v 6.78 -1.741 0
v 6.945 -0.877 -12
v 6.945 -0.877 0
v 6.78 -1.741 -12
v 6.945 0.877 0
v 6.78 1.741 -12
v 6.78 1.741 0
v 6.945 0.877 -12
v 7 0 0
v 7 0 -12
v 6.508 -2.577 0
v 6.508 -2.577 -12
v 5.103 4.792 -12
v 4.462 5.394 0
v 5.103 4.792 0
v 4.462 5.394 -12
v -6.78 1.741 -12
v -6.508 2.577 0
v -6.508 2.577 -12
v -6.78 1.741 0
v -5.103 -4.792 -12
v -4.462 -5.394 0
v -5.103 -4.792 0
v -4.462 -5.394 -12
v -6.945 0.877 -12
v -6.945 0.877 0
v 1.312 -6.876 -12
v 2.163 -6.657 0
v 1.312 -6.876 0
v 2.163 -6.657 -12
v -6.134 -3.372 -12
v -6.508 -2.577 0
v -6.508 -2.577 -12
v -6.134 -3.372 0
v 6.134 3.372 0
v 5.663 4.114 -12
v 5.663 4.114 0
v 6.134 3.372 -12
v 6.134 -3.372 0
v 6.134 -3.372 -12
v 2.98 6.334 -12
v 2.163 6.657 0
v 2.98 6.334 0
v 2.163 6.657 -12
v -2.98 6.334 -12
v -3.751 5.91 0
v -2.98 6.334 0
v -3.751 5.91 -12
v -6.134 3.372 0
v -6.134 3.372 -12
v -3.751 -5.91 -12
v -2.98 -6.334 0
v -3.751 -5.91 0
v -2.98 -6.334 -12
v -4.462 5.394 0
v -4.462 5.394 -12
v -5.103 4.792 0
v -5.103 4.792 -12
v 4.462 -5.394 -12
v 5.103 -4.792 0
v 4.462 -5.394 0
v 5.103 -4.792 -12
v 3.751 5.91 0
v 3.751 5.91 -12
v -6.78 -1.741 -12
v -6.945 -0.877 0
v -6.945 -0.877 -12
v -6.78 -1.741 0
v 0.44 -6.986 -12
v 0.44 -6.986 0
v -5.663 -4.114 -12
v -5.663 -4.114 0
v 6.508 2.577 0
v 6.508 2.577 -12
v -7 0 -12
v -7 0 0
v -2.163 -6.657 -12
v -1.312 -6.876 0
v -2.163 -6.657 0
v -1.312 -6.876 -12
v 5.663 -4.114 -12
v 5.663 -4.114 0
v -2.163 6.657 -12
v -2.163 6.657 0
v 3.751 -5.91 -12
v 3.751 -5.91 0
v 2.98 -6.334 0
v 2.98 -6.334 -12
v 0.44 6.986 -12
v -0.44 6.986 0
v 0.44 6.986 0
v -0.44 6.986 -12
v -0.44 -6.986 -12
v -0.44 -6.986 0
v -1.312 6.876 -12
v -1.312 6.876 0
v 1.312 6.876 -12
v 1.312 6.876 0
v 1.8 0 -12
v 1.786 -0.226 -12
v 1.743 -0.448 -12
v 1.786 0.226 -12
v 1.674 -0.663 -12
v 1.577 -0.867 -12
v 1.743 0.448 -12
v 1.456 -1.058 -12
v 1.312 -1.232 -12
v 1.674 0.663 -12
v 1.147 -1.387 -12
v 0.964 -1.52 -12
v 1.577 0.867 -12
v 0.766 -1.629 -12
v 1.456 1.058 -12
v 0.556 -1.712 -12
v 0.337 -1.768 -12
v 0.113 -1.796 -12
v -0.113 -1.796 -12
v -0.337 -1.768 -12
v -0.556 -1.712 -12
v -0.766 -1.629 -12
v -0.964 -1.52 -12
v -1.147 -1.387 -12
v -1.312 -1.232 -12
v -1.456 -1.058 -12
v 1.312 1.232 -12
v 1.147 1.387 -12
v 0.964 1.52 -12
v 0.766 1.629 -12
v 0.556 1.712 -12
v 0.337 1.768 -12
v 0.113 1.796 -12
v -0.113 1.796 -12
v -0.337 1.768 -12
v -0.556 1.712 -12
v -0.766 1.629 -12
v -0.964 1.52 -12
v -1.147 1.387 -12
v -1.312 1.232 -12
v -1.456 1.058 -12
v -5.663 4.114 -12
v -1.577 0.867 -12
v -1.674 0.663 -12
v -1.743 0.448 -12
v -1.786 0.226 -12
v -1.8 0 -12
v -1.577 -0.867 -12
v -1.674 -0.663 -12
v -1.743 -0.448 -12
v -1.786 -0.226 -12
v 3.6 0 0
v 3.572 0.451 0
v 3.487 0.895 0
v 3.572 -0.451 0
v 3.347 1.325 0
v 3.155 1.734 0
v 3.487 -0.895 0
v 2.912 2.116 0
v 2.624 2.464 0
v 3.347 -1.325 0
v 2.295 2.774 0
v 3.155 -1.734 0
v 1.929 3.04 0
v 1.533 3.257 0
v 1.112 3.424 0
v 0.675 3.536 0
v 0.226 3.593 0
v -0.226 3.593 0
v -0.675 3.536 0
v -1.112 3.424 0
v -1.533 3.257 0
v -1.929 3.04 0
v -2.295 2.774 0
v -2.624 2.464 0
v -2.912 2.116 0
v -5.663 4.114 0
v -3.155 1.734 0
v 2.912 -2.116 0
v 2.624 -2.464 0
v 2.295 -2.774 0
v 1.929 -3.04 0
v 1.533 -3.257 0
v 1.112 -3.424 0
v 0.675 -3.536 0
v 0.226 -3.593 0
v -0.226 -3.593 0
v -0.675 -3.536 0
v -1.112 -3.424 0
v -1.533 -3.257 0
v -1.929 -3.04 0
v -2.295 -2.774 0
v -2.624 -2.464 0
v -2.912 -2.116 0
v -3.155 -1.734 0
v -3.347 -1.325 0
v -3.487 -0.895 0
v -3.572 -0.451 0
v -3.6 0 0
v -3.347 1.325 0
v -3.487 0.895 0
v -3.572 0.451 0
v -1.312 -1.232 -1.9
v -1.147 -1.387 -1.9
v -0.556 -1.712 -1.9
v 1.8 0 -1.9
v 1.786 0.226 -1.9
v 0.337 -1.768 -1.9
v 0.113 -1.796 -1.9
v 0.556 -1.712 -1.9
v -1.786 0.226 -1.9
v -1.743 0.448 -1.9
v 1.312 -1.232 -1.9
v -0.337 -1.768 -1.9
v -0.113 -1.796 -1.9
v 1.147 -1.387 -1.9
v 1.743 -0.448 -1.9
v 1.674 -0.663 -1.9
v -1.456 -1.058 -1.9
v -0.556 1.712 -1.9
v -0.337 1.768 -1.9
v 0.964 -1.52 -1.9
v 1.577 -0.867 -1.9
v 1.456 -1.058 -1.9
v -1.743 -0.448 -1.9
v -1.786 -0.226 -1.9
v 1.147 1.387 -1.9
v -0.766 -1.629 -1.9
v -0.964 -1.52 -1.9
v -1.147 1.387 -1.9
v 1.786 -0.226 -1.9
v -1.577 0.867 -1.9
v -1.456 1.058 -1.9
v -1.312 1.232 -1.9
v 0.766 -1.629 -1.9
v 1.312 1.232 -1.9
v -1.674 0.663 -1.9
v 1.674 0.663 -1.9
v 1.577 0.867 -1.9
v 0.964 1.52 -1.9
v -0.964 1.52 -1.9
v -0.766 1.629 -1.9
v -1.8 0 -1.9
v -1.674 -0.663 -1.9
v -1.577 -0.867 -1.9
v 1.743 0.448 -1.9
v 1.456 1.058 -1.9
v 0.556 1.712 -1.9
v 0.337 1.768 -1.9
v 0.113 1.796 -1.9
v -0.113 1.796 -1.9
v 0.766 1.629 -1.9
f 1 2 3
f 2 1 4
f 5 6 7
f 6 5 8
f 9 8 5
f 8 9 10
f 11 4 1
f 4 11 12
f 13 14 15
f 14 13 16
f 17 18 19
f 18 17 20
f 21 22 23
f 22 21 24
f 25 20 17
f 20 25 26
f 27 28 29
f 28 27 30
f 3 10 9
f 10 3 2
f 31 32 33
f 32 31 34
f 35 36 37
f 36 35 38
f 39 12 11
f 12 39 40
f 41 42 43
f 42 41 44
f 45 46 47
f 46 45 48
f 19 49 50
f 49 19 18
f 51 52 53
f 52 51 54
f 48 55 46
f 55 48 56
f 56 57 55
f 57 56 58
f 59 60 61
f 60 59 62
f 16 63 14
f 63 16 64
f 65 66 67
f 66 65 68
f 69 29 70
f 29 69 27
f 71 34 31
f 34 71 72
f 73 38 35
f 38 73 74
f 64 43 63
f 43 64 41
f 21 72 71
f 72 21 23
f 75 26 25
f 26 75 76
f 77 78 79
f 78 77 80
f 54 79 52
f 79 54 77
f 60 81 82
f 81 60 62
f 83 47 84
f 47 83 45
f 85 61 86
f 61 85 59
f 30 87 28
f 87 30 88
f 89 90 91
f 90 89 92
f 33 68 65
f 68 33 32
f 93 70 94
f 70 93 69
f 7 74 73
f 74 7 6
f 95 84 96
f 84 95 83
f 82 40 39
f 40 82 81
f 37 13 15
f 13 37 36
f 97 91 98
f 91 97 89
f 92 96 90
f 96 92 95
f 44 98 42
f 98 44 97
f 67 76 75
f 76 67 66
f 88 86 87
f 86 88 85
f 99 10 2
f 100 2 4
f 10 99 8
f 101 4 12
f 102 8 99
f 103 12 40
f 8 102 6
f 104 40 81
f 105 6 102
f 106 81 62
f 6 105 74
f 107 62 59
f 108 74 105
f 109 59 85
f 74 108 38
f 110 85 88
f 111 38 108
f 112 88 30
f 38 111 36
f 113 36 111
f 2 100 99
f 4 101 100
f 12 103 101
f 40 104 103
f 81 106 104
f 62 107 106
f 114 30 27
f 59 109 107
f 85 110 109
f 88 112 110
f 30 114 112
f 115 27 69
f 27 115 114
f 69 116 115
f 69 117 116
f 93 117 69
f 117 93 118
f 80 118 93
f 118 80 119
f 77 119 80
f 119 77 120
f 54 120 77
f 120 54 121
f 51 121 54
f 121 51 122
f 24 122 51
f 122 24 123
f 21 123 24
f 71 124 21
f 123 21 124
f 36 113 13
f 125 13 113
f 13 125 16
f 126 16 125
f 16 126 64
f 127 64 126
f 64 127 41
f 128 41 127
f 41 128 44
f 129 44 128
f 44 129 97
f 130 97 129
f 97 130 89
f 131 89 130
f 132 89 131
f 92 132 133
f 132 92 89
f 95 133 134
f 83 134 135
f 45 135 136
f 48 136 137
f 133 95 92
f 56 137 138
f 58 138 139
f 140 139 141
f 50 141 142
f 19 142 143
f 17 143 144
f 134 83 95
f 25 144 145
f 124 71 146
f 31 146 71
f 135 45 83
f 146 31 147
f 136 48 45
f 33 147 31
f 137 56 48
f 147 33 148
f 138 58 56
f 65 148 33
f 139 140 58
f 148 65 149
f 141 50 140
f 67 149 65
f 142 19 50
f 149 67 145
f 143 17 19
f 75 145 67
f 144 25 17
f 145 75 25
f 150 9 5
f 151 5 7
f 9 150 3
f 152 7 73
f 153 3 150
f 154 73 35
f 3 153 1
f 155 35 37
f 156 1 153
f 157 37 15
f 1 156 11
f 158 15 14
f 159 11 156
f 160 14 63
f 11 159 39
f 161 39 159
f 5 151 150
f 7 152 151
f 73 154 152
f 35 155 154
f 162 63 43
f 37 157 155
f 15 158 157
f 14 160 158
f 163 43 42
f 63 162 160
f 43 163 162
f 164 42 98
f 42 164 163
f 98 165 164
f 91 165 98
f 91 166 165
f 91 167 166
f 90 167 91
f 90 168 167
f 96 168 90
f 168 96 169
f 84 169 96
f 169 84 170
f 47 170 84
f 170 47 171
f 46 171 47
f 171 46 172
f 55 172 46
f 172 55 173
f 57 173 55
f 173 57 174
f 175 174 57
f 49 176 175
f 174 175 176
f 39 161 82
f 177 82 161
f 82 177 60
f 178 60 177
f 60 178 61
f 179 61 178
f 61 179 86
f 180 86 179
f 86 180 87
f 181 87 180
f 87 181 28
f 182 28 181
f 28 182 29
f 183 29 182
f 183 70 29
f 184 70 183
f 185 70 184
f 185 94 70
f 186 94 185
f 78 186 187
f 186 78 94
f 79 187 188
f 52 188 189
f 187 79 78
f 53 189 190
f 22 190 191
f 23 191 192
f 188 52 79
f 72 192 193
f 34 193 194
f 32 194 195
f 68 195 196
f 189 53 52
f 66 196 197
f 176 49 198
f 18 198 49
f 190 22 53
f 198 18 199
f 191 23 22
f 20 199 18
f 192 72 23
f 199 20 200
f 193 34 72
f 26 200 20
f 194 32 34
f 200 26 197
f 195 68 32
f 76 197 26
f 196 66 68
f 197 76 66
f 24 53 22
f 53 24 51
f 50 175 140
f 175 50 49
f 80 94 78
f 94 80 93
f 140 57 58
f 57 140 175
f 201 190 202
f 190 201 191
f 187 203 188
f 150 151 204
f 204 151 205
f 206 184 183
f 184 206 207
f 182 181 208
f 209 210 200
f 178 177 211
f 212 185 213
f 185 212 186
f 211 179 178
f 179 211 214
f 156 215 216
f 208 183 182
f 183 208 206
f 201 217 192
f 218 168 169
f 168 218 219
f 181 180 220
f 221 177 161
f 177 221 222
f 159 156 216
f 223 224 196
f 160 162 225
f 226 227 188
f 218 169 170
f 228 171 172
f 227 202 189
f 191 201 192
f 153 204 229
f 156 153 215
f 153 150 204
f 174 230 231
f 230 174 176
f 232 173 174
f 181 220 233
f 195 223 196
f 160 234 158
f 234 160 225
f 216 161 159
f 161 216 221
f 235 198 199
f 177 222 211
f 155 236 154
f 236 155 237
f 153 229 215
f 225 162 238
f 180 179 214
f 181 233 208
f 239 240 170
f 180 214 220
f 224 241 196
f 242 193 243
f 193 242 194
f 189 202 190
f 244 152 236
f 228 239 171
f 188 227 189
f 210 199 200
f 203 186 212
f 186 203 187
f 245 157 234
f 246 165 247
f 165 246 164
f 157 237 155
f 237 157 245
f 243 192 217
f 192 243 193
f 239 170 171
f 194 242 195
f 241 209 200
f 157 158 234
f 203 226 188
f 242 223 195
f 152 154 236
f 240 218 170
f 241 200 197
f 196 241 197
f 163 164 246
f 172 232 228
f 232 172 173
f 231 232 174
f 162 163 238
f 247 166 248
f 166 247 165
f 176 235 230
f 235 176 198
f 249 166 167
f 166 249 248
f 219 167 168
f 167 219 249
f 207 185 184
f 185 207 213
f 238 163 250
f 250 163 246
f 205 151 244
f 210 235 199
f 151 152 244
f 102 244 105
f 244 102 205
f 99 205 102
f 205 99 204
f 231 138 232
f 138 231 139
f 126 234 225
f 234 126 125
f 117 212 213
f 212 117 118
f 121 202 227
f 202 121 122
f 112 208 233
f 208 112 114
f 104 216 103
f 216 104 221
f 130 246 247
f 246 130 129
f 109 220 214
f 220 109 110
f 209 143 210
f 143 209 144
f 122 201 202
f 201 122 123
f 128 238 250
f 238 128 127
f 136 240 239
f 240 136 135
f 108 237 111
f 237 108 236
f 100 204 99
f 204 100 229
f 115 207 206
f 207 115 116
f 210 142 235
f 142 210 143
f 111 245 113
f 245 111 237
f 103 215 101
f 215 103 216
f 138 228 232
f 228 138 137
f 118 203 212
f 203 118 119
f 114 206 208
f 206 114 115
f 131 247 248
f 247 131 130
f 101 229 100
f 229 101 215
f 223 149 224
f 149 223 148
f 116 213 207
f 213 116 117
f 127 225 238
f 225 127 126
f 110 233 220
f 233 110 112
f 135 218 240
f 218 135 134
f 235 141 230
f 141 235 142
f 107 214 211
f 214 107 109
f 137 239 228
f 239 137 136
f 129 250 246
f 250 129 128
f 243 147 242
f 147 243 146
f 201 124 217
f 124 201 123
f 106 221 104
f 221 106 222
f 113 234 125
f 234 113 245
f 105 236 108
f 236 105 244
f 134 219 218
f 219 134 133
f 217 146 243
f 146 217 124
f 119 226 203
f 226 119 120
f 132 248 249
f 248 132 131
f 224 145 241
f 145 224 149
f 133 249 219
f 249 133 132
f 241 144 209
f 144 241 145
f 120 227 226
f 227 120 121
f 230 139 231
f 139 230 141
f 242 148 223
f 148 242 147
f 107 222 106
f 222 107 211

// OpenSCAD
$fn = 50;


difference() {
	union() {
		translate(v = [0, 0, -12.0000000000]) {
			cylinder(h = 12, r = 7.0000000000);
		}
		translate(v = [0, 0, -12.0000000000]) {
			cylinder(h = 12, r = 2.8750000000);
		}
	}
	union() {
		translate(v = [0, 0, 0]) {
			rotate(a = [0, 0, 0]) {
				difference() {
					union() {
						translate(v = [0, 0, -12.0000000000]) {
							cylinder(h = 12, r = 1.5000000000);
						}
						translate(v = [0, 0, -1.9000000000]) {
							cylinder(h = 1.9000000000, r1 = 1.8000000000, r2 = 3.6000000000);
						}
						translate(v = [0, 0, -12.0000000000]) {
							cylinder(h = 12, r = 1.8000000000);
						}
						translate(v = [0, 0, -12.0000000000]) {
							cylinder(h = 12, r = 1.5000000000);
						}
					}
					union();
				}
			}
		}
	}
}
